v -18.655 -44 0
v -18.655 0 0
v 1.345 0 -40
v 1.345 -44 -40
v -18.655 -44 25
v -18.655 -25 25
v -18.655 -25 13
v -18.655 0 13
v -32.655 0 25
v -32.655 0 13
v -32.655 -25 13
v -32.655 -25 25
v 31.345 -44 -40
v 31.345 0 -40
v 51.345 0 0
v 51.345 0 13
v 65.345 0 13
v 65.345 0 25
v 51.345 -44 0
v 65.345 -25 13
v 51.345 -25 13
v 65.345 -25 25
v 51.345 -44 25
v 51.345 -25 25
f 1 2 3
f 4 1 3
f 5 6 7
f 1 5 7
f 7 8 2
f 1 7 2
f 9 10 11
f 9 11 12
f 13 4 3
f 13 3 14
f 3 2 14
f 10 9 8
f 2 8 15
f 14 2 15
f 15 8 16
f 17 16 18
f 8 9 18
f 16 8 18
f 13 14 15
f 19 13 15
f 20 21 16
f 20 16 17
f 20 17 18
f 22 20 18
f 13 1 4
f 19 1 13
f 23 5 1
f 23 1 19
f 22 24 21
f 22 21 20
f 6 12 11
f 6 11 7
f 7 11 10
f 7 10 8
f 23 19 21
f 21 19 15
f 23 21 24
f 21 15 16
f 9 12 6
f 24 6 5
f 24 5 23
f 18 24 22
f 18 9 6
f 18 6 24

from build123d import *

# Parameters (mm, degrees)
F1_DEPTH = 44
F0_W     = 14
F0_H     = 12
F2_DEPTH = 25


with BuildPart() as f1:
    # F0 (on Front) → F1 (new body)
    with BuildSketch(Plane.XZ):
        Polygon((51.345316, 25), (-18.654684, 25), (-18.654684, 13), (-18.654684, 0), (1.345316, -40), (31.345316, -40), (51.345316, 0), (51.345316, 13), align=None)
    extrude(amount=F1_DEPTH)

    # F0 (on Front) → F2 (join)
    with BuildSketch(Plane.XZ):
        with Locations((-25.654684, 19)):
            Rectangle(F0_W, F0_H)
        with Locations((58.345316, 19)):
            Rectangle(F0_W, F0_H)
    extrude(amount=F2_DEPTH)


solid = f1.part
